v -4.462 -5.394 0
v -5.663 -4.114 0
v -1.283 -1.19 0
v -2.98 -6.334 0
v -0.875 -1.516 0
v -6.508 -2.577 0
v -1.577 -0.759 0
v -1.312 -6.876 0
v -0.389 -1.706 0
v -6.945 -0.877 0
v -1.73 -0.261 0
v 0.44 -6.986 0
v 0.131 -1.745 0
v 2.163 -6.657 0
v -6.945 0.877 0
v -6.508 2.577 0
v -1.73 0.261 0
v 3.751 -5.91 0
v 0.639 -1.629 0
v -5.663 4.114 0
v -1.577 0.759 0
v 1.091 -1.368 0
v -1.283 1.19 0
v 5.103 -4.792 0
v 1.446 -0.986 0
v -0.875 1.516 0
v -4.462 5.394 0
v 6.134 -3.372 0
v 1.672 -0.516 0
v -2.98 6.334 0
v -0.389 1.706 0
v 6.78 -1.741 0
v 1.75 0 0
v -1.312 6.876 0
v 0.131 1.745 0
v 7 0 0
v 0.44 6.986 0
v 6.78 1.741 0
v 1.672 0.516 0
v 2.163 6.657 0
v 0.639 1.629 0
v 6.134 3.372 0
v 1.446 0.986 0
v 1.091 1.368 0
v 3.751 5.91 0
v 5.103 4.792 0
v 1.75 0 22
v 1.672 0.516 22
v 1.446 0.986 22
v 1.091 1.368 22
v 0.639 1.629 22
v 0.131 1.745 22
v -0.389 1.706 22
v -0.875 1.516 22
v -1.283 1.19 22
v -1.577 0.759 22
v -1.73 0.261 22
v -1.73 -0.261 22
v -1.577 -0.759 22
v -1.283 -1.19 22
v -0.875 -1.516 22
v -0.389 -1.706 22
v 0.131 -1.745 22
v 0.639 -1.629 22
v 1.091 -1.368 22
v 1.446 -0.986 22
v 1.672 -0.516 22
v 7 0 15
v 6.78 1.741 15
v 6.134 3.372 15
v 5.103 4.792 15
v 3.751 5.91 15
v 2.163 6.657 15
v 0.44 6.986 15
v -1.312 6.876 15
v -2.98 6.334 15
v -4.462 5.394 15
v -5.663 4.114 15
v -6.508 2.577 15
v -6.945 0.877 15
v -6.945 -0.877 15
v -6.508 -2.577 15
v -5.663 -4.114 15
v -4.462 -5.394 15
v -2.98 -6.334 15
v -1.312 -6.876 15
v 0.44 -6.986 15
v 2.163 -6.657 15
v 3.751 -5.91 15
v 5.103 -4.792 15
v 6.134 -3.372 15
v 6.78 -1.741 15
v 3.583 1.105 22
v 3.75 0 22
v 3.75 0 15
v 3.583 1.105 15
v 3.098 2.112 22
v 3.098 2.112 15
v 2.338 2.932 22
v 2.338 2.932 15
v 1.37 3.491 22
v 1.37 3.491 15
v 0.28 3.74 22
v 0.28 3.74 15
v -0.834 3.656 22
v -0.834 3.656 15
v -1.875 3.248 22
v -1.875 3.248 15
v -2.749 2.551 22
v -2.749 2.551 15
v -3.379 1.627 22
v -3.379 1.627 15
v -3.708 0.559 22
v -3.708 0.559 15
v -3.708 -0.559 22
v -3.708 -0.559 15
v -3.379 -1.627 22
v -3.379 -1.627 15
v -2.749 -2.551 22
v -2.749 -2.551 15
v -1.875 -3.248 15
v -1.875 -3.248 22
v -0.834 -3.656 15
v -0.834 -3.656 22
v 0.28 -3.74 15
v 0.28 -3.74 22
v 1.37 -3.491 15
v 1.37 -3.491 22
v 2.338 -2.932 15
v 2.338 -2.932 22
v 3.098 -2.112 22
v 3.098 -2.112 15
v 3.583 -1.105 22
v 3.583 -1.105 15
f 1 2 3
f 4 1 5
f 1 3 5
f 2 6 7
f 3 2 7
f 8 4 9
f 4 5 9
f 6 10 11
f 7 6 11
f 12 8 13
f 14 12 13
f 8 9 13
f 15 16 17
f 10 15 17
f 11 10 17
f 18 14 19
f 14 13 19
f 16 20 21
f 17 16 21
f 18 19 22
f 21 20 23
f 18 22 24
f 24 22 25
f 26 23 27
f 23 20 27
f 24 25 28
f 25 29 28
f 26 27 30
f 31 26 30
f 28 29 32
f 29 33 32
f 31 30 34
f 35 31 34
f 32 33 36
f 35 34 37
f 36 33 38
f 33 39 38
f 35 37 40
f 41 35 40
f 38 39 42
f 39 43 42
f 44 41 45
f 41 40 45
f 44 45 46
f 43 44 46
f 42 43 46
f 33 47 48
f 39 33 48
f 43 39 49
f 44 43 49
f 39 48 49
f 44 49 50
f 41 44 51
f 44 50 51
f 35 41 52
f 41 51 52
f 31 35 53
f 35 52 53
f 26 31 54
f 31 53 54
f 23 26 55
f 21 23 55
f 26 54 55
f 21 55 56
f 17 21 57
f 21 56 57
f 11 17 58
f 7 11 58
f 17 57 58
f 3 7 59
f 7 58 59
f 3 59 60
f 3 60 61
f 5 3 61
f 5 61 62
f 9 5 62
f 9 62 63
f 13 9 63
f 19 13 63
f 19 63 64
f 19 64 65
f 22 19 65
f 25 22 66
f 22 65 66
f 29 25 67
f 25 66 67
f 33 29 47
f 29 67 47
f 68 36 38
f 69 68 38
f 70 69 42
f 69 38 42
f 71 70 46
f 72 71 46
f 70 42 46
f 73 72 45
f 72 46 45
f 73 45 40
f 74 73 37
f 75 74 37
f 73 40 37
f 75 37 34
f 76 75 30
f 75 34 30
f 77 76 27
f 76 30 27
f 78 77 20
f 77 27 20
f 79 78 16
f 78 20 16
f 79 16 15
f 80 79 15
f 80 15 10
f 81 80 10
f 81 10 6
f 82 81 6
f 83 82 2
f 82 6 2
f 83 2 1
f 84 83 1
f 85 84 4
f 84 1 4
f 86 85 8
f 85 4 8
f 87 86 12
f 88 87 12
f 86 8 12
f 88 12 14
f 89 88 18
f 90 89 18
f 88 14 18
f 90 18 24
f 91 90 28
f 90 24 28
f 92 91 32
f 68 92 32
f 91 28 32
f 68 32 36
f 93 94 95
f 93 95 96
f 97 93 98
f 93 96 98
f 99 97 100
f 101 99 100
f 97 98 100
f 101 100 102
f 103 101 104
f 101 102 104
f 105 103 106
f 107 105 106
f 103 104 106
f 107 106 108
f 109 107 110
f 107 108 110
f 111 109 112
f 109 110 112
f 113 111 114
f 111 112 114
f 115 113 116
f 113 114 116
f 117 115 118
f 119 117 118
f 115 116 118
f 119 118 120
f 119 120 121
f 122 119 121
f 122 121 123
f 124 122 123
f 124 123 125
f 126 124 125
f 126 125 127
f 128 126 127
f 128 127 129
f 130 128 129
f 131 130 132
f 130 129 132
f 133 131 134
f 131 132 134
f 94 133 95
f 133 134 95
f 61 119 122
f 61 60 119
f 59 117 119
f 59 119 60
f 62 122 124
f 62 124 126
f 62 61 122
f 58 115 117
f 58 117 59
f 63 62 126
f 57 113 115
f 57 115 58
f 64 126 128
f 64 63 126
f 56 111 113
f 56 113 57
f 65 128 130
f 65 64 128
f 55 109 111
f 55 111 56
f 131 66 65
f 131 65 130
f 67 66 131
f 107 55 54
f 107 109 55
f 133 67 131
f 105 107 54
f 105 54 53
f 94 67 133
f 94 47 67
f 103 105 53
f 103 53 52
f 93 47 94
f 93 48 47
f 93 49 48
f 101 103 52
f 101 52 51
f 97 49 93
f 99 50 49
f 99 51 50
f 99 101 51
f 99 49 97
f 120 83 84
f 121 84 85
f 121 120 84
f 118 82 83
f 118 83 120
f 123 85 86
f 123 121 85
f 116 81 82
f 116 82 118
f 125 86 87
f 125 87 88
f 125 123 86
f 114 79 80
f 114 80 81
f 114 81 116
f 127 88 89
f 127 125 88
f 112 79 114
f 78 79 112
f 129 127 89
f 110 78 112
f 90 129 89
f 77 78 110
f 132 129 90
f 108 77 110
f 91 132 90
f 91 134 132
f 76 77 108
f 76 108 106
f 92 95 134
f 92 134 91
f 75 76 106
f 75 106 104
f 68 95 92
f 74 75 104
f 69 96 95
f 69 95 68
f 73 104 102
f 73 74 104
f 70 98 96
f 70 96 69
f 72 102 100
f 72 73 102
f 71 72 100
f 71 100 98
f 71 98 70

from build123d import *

# Parameters (mm, degrees)
SKETCH1_R           = 7
BOSS_EXTRUDE1_DEPTH = 15
SKETCH2_R           = 3.75
BOSS_EXTRUDE2_DEPTH = 7
SKETCH3_R           = 1.75
CUT_EXTRUDE1_DEPTH  = 22


with BuildPart() as part:
    # Sketch1 → Boss-Extrude1 (new body)
    with BuildSketch(Plane(origin=(0, 0, 0), x_dir=(0, 1, 0), z_dir=(0, 0, 1))):
        with Locations(Location((0, 0, 0), (0, 0, 270))):
            Circle(SKETCH1_R)
    extrude(amount=BOSS_EXTRUDE1_DEPTH)

    # Sketch2 → Boss-Extrude2 (add)
    with BuildSketch(Plane.XY.offset(15)):
        Circle(SKETCH2_R)
    extrude(amount=BOSS_EXTRUDE2_DEPTH)

    # Sketch3 → Cut-Extrude1 (cut)
    with BuildSketch(Plane.XY.offset(22)):
        Circle(SKETCH3_R)
    extrude(amount=-CUT_EXTRUDE1_DEPTH, mode=Mode.SUBTRACT)


solid = part.part
